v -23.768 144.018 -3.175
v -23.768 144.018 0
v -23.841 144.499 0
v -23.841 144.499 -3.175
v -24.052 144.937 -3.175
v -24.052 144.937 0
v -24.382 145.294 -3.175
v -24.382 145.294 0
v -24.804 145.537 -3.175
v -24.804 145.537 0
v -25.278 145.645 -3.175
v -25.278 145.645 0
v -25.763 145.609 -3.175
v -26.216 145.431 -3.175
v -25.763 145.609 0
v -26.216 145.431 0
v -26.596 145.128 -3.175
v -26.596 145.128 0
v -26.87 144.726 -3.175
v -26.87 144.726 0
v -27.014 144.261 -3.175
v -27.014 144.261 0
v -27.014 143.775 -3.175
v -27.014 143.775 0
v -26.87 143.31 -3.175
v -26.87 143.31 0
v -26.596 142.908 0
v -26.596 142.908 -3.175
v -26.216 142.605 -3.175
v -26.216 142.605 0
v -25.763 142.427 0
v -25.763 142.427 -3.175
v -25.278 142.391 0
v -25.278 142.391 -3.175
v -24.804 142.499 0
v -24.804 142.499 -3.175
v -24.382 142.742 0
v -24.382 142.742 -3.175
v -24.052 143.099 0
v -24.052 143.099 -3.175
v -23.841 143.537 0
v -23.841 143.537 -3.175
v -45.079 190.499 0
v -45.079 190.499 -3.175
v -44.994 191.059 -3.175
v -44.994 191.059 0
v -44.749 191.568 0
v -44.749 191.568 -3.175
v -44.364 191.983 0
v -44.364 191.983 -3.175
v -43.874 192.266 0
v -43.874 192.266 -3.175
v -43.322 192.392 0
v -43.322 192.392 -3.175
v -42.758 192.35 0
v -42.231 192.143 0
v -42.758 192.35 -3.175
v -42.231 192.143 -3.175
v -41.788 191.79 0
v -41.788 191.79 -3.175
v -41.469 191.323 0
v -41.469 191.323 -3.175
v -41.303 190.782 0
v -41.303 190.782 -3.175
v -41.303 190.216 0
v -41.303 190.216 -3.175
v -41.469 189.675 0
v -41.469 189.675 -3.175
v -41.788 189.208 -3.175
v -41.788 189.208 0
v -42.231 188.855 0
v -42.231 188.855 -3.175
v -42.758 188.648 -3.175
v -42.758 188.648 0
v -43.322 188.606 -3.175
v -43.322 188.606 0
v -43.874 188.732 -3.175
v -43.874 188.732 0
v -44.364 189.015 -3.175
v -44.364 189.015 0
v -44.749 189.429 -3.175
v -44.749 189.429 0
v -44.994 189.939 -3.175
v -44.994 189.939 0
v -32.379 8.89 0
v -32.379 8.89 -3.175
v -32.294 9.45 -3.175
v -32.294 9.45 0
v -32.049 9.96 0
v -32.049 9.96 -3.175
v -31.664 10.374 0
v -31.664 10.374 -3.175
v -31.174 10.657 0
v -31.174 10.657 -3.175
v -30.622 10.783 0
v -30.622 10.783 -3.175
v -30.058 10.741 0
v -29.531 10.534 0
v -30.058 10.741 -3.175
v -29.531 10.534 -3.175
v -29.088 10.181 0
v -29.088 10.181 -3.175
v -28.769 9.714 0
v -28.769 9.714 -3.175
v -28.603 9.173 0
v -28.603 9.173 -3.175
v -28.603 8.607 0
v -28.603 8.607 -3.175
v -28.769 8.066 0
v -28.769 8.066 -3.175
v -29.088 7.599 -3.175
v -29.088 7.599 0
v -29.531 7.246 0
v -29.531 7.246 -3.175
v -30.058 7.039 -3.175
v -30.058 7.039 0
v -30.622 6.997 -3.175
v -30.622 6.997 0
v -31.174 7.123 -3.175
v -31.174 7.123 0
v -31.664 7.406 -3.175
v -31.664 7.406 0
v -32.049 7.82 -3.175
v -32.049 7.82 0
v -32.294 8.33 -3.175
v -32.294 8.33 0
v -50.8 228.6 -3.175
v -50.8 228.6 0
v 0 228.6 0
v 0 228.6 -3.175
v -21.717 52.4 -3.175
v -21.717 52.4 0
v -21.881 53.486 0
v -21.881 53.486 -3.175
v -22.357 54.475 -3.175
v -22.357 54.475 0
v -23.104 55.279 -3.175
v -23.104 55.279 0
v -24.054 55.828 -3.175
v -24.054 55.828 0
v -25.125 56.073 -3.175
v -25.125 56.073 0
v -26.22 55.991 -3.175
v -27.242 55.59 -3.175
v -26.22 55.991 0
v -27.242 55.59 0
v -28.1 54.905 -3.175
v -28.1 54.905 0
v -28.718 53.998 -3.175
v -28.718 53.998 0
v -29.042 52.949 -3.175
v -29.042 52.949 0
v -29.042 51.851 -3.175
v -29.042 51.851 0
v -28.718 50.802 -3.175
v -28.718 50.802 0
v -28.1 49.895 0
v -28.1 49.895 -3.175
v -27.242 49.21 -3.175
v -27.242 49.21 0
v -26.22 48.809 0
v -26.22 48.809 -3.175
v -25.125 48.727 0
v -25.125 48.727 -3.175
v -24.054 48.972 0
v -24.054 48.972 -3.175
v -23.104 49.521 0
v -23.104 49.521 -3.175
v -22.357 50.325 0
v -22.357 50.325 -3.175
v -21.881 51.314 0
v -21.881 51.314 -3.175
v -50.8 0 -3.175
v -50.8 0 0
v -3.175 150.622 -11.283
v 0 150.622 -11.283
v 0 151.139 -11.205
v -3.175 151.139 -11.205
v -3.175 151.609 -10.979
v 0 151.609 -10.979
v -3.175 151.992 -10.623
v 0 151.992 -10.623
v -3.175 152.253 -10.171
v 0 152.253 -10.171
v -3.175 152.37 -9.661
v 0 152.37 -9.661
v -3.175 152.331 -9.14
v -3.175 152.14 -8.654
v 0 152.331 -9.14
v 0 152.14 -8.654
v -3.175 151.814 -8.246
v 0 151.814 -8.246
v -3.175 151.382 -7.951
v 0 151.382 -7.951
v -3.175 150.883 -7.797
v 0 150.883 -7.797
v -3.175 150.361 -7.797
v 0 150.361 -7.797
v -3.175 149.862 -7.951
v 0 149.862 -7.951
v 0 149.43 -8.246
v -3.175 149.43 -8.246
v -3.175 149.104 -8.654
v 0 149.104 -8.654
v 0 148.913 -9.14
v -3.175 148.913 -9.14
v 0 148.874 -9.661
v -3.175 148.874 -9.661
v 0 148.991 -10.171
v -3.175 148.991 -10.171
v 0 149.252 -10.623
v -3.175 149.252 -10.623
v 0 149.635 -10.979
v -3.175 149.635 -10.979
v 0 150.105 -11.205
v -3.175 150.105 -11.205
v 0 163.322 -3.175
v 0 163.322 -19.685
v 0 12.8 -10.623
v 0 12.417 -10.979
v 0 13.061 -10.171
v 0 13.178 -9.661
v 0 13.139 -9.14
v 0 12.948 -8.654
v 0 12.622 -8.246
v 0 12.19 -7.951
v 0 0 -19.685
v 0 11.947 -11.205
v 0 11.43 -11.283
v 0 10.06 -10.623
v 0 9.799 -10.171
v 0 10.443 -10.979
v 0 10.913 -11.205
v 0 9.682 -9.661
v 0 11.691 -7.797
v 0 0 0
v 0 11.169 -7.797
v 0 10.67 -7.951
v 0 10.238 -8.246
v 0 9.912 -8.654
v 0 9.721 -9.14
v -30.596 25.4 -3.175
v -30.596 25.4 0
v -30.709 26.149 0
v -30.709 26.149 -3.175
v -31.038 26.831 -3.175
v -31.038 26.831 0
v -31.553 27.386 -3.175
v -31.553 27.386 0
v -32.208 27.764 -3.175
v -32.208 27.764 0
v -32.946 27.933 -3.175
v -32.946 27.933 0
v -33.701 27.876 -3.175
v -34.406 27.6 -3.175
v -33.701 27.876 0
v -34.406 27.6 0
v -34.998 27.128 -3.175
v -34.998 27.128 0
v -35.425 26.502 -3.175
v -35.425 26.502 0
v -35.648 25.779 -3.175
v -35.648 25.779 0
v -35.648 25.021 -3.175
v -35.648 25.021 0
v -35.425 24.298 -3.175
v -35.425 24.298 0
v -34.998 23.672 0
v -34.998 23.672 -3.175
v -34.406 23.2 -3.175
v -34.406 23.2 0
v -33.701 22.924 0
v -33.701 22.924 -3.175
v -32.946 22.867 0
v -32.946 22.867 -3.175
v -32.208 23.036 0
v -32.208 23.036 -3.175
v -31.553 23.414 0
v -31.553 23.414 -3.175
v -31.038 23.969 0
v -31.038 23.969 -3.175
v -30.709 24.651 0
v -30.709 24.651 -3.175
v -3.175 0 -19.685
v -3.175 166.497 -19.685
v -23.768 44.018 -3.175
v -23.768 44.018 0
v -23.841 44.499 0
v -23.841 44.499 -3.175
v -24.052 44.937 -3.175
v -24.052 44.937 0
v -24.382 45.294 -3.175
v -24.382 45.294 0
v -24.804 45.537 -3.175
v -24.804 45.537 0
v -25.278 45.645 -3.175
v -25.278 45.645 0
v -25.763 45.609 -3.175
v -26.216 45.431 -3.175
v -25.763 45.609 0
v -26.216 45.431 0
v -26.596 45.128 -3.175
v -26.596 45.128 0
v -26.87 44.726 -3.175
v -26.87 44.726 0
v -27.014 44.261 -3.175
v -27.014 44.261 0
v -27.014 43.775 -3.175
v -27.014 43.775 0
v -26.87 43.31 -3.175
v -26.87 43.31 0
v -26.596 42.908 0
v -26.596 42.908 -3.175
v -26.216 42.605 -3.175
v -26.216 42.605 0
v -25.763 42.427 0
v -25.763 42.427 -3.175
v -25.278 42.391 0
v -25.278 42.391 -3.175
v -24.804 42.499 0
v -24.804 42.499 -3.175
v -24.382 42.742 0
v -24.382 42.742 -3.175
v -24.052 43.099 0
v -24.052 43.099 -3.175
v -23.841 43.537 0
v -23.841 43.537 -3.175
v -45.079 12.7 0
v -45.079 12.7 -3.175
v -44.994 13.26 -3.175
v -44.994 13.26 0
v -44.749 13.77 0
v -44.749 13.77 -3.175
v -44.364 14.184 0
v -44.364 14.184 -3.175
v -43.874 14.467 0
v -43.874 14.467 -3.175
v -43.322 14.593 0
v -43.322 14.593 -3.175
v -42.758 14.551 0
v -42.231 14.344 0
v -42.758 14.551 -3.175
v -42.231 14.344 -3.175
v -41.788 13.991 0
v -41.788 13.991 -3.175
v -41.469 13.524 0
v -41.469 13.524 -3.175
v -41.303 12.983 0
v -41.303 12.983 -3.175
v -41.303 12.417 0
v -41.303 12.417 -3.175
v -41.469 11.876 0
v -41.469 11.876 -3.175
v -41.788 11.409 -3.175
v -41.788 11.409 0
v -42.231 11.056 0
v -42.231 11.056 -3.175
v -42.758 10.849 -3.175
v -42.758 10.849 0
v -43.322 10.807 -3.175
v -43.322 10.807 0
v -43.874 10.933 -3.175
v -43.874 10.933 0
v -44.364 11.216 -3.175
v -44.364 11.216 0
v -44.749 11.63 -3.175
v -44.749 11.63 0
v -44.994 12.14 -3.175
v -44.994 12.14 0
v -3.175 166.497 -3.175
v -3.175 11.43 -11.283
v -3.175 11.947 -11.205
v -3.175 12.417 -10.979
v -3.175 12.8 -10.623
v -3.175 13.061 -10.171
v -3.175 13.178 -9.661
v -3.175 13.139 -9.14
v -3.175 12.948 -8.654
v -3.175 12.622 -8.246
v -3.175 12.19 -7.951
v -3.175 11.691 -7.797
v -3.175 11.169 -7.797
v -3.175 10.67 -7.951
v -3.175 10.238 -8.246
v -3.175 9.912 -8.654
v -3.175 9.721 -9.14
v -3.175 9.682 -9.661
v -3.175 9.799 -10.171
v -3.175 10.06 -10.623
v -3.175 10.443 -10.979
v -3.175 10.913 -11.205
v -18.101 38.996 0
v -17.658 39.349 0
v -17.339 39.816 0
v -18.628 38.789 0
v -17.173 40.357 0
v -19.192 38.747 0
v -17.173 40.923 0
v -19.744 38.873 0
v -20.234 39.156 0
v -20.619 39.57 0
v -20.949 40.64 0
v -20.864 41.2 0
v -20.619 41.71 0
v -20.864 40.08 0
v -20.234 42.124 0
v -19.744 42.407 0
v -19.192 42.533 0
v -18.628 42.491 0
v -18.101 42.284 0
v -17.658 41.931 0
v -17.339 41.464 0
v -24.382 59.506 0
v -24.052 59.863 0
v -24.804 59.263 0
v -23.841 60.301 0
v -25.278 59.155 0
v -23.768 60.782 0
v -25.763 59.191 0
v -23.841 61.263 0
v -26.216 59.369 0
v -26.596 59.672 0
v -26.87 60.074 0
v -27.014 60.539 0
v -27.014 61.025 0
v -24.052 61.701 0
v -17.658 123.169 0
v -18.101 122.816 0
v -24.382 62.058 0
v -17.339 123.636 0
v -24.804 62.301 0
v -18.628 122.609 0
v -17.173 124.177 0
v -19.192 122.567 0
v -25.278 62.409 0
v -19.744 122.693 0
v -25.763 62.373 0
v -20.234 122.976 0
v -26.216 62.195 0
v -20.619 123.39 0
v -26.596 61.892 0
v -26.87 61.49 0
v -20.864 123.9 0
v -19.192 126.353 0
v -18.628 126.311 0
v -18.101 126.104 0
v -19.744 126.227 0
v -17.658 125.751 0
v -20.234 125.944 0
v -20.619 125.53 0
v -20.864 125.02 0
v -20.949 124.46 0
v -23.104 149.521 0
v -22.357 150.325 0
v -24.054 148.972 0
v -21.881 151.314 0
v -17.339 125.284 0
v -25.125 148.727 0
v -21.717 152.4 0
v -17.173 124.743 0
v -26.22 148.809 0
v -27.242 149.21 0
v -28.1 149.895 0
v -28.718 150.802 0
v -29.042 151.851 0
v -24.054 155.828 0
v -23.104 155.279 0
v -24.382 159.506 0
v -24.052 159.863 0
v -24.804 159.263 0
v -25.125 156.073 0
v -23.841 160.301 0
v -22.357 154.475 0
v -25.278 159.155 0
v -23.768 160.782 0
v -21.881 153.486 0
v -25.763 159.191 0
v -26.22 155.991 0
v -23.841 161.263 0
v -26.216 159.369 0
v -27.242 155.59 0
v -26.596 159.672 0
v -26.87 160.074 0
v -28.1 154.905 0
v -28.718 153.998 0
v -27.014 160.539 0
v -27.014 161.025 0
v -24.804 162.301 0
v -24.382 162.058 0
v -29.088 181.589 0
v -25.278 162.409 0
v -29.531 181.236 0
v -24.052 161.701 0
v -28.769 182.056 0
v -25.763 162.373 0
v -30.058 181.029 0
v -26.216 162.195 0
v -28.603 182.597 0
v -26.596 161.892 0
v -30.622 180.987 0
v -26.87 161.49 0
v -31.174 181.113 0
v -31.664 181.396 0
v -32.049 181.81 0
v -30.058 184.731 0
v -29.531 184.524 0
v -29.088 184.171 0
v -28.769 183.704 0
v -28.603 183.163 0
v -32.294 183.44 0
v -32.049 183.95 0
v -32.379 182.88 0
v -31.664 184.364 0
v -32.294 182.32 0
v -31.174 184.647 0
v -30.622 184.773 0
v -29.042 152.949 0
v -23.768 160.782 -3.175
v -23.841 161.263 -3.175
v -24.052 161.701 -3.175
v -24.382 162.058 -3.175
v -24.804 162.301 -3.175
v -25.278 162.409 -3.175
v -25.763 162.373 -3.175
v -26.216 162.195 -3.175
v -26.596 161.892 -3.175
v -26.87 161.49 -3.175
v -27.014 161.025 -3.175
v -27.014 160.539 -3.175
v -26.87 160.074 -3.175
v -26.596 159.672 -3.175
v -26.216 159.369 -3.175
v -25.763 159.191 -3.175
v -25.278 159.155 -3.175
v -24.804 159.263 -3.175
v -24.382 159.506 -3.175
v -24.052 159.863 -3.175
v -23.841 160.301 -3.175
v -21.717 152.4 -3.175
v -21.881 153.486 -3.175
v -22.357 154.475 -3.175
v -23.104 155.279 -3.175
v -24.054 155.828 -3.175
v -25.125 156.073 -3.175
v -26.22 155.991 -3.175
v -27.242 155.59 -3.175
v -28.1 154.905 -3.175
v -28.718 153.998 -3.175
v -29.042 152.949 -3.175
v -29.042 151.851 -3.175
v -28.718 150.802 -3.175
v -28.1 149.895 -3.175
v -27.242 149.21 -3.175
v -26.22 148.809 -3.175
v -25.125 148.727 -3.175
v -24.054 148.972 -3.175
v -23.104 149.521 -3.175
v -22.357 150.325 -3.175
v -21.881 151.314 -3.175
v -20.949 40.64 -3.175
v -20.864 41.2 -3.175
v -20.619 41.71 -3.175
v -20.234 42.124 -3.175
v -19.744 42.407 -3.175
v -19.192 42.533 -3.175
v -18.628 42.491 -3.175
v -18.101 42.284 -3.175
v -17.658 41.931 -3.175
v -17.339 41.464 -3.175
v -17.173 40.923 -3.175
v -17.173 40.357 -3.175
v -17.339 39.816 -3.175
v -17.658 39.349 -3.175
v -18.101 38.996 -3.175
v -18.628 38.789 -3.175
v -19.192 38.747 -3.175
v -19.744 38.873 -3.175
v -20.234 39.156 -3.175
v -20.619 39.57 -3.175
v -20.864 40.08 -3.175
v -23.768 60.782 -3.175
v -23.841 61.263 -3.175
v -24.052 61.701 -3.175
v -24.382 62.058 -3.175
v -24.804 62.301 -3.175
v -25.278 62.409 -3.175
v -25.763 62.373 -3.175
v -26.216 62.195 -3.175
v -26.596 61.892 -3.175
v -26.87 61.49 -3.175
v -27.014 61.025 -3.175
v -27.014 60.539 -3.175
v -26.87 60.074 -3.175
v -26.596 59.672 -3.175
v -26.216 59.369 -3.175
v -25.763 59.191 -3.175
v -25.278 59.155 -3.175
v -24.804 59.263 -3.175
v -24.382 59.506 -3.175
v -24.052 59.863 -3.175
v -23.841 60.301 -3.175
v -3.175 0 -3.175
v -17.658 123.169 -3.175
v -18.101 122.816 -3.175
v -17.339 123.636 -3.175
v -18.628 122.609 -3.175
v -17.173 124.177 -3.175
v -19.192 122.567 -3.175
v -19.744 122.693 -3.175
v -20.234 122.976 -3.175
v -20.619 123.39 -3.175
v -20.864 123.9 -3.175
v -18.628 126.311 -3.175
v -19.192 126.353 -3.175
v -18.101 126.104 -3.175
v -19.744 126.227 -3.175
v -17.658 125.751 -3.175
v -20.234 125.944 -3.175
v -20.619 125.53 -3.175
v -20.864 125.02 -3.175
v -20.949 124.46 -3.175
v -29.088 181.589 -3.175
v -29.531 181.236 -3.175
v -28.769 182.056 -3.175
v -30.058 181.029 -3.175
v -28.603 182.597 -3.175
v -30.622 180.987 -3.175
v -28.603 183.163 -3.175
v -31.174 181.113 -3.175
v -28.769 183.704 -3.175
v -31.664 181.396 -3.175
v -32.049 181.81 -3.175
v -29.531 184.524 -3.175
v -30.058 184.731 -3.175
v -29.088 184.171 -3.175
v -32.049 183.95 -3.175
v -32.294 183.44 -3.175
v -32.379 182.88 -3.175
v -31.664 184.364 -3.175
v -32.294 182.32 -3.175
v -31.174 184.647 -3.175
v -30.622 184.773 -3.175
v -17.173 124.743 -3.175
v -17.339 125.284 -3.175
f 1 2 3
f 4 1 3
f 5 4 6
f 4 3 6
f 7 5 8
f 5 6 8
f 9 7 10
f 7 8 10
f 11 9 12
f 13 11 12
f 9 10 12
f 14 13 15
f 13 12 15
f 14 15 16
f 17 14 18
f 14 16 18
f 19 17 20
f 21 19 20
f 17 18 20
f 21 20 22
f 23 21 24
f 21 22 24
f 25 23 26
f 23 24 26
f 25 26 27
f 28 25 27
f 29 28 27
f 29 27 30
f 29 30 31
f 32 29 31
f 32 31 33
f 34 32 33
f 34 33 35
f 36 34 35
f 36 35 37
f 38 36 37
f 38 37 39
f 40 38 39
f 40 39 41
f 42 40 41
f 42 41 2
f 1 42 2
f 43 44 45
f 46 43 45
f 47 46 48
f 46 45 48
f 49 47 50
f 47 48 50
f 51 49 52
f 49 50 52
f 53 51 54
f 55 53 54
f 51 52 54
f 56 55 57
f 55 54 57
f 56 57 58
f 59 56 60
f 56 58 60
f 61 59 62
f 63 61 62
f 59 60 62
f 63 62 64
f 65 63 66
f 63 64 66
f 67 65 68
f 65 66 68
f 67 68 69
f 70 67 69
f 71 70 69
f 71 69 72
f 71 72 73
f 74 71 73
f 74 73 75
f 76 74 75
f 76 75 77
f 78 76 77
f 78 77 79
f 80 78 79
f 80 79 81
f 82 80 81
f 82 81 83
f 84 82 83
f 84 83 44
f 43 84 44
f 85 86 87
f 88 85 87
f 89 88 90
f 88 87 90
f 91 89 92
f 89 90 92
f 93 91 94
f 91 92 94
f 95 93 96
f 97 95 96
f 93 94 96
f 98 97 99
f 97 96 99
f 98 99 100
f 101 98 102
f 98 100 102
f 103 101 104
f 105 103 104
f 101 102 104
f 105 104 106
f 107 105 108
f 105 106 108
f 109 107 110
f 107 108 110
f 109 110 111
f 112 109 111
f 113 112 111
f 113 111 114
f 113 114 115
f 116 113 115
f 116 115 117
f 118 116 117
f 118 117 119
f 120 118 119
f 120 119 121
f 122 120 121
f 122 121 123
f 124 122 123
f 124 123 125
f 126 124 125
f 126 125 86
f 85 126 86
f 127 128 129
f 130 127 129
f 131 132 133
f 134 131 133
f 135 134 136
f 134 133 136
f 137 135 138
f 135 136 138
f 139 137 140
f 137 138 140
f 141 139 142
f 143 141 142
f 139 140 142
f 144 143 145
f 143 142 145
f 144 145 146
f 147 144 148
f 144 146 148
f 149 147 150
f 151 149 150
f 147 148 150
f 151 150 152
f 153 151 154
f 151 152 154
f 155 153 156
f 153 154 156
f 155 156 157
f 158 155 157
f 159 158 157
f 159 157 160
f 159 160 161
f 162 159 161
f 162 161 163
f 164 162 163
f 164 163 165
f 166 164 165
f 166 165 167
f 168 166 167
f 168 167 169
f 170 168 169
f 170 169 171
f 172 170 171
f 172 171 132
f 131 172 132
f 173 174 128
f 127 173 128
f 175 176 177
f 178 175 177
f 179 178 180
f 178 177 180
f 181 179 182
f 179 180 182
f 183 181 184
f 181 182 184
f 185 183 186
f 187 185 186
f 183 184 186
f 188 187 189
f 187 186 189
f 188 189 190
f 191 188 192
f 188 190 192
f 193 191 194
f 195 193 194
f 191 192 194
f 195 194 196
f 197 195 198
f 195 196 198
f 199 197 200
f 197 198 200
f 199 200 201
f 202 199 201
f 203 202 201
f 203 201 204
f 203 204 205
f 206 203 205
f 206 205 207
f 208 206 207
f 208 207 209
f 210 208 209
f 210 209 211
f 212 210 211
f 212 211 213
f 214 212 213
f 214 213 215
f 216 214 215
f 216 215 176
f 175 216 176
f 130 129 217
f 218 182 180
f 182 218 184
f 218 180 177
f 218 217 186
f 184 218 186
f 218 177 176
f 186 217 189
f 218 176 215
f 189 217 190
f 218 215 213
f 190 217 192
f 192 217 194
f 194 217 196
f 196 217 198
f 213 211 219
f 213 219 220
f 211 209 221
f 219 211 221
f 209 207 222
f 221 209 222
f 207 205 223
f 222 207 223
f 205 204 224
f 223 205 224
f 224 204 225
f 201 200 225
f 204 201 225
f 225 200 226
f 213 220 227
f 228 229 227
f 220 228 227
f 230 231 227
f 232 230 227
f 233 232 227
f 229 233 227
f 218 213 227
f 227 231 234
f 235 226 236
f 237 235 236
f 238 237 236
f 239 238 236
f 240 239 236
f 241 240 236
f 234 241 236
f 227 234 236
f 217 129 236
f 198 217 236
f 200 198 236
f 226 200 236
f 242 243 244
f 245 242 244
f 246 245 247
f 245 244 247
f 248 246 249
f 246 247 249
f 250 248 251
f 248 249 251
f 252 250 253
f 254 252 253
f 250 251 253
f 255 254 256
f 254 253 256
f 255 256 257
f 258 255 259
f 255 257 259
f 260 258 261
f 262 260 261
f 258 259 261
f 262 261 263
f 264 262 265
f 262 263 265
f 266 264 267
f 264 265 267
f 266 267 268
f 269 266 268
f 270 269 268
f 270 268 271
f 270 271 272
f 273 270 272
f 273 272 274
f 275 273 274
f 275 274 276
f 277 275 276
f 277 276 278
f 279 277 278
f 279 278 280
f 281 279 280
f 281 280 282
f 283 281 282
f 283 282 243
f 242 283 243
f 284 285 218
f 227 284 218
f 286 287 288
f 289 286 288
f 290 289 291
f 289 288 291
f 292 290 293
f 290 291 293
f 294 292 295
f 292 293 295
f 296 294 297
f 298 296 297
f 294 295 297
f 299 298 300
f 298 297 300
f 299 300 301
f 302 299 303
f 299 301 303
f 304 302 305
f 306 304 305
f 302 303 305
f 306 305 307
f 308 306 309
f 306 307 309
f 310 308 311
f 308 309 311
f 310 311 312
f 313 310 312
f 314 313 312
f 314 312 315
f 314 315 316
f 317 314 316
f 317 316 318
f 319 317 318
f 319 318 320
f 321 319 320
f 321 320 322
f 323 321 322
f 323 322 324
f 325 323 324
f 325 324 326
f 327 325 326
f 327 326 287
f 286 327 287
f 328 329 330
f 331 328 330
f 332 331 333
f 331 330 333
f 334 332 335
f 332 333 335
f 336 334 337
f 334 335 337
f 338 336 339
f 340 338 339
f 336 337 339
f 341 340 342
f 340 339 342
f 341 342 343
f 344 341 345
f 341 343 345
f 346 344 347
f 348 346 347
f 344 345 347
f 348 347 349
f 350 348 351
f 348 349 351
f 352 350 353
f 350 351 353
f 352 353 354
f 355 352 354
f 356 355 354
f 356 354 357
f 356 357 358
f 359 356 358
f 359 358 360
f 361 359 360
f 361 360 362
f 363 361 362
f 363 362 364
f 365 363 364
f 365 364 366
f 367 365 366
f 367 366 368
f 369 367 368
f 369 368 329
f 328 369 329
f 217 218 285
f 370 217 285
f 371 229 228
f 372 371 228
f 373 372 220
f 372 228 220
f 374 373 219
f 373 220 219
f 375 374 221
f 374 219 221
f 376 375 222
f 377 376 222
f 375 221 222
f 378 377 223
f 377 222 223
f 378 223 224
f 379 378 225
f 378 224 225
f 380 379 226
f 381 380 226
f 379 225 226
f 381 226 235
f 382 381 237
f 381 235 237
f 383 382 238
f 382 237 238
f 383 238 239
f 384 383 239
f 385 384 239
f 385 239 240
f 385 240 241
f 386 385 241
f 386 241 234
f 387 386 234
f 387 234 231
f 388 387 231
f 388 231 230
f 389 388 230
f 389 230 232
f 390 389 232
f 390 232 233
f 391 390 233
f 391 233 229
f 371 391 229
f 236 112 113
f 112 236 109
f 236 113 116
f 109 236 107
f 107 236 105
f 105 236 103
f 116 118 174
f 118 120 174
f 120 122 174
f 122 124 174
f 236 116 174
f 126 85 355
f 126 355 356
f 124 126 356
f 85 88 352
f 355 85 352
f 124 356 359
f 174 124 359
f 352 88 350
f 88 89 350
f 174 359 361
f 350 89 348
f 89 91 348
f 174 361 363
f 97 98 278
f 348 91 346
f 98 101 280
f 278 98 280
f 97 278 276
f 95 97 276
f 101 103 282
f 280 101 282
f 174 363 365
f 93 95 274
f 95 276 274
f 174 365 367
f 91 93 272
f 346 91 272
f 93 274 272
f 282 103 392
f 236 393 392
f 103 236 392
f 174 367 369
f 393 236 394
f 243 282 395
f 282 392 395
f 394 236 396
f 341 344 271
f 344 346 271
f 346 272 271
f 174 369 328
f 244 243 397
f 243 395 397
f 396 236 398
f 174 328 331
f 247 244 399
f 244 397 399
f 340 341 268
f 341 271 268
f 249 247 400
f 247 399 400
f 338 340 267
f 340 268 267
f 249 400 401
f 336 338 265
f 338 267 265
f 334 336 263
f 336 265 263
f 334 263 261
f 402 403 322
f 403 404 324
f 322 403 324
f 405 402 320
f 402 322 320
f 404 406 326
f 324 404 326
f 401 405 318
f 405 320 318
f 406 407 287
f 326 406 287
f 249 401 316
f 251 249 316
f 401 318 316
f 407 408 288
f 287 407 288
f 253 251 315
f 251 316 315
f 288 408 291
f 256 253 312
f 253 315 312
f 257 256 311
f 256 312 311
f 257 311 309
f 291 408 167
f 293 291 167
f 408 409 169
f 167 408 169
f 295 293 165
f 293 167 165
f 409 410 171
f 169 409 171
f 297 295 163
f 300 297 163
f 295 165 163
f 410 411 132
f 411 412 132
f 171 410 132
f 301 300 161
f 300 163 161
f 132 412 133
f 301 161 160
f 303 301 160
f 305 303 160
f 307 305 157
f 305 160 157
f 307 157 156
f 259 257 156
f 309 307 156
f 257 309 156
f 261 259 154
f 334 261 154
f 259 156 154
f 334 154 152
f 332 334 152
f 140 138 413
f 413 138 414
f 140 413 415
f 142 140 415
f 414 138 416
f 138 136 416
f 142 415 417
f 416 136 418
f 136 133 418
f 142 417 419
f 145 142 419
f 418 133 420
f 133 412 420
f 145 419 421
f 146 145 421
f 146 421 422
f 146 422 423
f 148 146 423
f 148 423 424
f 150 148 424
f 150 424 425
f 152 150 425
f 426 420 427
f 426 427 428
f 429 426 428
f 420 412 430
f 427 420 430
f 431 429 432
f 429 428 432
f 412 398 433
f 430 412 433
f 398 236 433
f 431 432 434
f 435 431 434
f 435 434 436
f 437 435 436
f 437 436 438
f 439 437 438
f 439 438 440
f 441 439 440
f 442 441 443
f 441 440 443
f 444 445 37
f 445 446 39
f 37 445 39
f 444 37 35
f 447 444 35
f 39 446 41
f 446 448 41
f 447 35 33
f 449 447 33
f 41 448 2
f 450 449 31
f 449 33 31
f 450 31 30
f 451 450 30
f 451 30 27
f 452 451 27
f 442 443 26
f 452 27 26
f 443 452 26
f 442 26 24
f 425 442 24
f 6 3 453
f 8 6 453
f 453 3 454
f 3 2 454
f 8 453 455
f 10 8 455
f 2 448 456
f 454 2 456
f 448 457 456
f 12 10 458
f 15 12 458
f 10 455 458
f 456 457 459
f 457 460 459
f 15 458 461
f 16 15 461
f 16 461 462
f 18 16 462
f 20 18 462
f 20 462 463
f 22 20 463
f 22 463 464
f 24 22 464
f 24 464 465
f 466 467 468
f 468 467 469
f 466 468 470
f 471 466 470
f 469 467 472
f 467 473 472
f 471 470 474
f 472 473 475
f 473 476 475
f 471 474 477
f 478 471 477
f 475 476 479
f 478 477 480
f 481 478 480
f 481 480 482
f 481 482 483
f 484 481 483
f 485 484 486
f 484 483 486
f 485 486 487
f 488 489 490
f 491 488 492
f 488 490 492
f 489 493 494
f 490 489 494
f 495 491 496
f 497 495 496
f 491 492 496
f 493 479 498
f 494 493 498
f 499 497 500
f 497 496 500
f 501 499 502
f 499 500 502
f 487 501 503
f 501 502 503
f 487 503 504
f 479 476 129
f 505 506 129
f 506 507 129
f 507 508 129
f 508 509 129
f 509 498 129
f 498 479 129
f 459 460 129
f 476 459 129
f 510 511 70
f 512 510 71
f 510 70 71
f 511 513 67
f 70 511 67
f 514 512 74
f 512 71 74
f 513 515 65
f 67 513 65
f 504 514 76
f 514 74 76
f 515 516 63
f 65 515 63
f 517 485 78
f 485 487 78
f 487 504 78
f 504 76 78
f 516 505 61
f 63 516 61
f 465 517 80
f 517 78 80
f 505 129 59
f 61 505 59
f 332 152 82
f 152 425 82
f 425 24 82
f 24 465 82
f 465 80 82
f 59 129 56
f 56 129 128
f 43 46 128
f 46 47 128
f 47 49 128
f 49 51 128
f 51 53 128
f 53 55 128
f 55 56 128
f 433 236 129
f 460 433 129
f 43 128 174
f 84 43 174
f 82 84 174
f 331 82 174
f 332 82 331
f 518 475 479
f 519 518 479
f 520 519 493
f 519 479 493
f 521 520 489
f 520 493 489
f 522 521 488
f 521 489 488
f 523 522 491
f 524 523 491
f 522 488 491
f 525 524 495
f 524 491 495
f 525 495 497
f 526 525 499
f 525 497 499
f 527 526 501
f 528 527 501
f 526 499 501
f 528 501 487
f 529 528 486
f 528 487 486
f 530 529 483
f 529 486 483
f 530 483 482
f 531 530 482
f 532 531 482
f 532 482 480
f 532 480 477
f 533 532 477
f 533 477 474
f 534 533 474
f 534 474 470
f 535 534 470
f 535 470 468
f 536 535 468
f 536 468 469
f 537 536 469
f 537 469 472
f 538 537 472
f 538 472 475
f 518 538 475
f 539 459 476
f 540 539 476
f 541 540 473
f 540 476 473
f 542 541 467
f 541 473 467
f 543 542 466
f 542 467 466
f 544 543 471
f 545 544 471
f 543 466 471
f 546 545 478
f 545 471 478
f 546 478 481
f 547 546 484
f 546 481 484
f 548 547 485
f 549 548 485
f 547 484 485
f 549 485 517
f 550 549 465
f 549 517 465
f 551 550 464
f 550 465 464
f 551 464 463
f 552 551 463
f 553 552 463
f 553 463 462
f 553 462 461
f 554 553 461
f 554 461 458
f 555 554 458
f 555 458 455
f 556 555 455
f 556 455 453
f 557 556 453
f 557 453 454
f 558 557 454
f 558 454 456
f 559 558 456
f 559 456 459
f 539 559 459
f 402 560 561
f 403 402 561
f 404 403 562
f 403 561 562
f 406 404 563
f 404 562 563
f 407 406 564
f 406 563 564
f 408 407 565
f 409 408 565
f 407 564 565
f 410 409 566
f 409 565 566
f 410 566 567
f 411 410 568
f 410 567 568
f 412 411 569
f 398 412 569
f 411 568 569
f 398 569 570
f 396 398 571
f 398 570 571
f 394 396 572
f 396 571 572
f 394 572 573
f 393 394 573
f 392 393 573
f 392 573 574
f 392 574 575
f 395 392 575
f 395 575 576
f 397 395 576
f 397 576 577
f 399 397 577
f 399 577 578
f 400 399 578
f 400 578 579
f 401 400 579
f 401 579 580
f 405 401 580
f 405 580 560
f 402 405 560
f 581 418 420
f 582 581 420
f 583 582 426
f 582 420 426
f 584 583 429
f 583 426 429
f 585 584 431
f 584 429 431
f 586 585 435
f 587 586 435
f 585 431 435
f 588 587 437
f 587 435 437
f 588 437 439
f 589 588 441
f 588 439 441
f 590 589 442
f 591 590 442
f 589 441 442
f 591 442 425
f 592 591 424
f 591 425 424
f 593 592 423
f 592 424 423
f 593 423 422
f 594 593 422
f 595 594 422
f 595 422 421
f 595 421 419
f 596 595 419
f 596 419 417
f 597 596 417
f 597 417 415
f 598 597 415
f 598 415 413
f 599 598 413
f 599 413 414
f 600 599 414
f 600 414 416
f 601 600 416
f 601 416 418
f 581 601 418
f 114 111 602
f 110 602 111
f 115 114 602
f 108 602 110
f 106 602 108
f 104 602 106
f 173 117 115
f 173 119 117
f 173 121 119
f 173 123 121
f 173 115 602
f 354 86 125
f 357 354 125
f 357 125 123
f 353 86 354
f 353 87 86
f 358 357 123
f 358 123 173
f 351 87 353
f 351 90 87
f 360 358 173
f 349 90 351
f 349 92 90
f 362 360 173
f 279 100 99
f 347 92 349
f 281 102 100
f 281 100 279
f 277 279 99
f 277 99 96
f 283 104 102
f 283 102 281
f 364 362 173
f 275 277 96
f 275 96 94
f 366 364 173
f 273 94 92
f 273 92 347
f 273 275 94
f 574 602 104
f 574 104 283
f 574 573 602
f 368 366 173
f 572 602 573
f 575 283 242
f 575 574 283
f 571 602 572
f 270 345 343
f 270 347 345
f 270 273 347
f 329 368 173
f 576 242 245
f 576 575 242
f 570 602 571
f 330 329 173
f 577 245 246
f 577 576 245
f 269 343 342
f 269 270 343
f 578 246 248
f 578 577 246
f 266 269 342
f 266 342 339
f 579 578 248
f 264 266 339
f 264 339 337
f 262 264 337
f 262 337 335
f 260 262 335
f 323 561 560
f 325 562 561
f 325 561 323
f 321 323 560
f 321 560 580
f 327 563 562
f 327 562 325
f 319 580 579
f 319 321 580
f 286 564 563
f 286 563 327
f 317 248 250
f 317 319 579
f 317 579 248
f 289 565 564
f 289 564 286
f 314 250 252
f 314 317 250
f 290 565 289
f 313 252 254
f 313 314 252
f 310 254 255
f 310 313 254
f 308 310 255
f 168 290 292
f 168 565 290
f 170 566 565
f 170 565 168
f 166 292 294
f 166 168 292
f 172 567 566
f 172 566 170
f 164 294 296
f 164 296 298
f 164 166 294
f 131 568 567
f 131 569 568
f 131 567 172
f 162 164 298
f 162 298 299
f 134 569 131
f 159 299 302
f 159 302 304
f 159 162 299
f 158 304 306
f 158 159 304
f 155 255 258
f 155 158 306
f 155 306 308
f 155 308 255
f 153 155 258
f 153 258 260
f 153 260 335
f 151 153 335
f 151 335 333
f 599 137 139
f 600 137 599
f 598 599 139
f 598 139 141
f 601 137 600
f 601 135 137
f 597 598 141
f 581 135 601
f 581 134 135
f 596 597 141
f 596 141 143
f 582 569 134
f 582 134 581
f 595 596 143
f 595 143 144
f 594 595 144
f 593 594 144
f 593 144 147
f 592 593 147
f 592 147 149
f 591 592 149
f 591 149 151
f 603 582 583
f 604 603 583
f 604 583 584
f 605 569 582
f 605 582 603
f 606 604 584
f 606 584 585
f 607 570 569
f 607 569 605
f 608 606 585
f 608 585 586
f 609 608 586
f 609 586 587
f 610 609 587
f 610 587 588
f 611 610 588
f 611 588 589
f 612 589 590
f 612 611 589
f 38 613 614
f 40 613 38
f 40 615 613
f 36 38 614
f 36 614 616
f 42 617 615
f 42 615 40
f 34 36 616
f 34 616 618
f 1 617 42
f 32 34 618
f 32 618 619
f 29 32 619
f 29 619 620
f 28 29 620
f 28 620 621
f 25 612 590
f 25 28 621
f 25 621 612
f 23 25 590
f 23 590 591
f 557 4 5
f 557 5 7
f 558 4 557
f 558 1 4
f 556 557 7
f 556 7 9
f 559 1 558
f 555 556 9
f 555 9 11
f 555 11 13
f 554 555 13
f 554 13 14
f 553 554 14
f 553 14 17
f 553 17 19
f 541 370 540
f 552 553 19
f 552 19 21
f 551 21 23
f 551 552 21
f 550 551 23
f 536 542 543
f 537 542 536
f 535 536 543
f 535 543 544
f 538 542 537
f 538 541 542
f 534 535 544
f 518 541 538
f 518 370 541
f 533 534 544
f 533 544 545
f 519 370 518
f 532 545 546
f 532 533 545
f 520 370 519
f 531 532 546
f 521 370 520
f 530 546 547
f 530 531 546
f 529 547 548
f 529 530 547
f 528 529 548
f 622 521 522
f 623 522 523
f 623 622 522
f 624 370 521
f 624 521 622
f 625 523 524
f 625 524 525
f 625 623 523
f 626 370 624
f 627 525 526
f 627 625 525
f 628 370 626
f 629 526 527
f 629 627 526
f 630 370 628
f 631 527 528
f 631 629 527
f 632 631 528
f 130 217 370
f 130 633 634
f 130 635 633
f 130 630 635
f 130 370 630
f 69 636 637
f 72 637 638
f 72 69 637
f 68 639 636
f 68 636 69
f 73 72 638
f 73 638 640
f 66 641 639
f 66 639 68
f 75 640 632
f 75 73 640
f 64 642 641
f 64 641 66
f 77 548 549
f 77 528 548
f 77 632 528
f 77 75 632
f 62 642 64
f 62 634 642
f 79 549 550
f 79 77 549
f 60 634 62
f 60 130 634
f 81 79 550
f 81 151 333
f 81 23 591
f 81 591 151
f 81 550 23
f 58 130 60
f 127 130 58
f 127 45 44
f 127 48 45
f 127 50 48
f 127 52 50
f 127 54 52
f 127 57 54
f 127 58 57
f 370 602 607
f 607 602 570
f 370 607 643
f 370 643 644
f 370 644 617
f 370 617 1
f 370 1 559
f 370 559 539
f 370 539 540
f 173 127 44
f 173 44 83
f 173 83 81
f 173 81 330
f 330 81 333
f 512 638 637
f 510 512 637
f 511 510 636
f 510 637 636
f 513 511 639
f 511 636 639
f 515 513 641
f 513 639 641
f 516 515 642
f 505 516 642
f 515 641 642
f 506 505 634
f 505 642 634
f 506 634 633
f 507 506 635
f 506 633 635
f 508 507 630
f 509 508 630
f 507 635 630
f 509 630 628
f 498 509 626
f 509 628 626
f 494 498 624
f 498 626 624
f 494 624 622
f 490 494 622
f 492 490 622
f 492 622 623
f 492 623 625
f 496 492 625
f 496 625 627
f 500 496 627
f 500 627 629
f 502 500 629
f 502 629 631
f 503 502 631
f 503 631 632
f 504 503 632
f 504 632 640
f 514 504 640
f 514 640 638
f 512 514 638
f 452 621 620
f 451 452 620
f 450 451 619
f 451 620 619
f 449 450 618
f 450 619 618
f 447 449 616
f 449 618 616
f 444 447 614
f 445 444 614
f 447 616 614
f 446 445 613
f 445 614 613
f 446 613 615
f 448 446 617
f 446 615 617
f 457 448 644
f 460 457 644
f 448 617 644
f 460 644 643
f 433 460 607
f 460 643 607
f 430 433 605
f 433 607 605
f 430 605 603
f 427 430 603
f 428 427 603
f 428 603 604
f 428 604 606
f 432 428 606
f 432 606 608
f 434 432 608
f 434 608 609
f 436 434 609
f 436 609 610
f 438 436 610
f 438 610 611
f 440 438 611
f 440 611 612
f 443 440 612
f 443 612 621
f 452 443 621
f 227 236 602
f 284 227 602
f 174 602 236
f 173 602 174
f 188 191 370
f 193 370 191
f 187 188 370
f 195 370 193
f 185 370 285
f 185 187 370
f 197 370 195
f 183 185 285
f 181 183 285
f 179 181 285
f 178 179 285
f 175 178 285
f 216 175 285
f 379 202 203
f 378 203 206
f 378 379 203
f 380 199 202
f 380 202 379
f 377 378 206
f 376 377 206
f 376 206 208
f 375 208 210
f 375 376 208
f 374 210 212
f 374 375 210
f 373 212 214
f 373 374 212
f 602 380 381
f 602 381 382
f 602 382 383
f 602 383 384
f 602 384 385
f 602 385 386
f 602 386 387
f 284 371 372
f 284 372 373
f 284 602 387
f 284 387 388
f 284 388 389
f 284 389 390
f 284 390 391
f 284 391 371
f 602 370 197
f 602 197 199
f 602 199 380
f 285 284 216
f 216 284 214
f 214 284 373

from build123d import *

# Parameters (mm, degrees)
BOSS_EXTRUDE1_DEPTH     = 203.2
CUT_EXTRUDE2_DEPTH      = 20.685
SKETCH5_R               = 3.683
SKETCH5_R_2             = 1.63195
CUT_EXTRUDE3_DEPTH      = 20.685
SKETCH6_R               = 1.7526
CUT_EXTRUDE4_DEPTH      = 51.8
SKETCH8_R               = 1.89865
CUT_EXTRUDE5_DEPTH      = 4.175
SKETCH9_R               = 1.89865
CUT_EXTRUDE6_DEPTH      = 4.175
BOSS_EXTRUDE2_DEPTH     = 3.175
SKETCH11_R              = 2.54
CUT_EXTRUDE7_DEPTH      = 20.685
SKETCH12_R              = 1.89865
CUT_EXTRUDE8_DEPTH      = 4.175
SKETCH13_R              = 3.683
SKETCH13_R_2            = 1.63195
CUT_EXTRUDE9_DEPTH      = 1
CUT_EXTRUDE9_DEPTH_BACK = 20.685


with BuildPart() as part:
    # Sketch1 → Boss-Extrude1 (new body)
    with BuildSketch(Plane(origin=(0, 0, 0), x_dir=(1, 0, 0), z_dir=(0, 1, 0))):
        Polygon((0, 0), (-50.8, 0), (-50.8, 3.175), (-3.175, 3.175), (-3.175, 19.685), (0, 19.685), align=None)
    extrude(amount=BOSS_EXTRUDE1_DEPTH)

    # Sketch4 → Cut-Extrude2 (cut, through all)
    with BuildSketch(Plane.XY):
        Polygon((-50.8, 214.122), (-57.250524058, 214.122), (-57.250524058, 247.071987418), (14.491605927, 247.071987418), (14.491605927, 163.322), (0, 163.322), align=None)
    extrude(amount=-CUT_EXTRUDE2_DEPTH, mode=Mode.SUBTRACT)

    # Sketch5 → Cut-Extrude3 (cut, through all)
    with BuildSketch(Plane.XY):
        with Locations((-25.4, 152.4)):
            Circle(SKETCH5_R)
        with Locations((-25.4, 160.782)):
            Circle(SKETCH5_R_2)
        with Locations((-25.4, 144.018)):
            Circle(SKETCH5_R_2)
    extrude(amount=-CUT_EXTRUDE3_DEPTH, mode=Mode.SUBTRACT)

    # Sketch6 → Cut-Extrude4 (cut, through all)
    with BuildSketch(Plane(origin=(0, 0, 0), x_dir=(0, 0, -1), z_dir=(1, 0, 0))):
        with Locations((9.530474513, 11.43)):
            Circle(SKETCH6_R)
        with Locations((9.530474513, 150.622)):
            Circle(SKETCH6_R)
    extrude(amount=-CUT_EXTRUDE4_DEPTH, mode=Mode.SUBTRACT)

    # Sketch8 → Cut-Extrude5 (cut, through all)
    with BuildSketch(Plane(origin=(0, 0, -3.175), x_dir=(-1, 0, 0), z_dir=(0, 0, -1))):
        with Locations((30.48, 8.89)):
            Circle(SKETCH8_R)
        with Locations((30.48, 182.88)):
            Circle(SKETCH8_R)
    extrude(amount=-CUT_EXTRUDE5_DEPTH, mode=Mode.SUBTRACT)

    # Sketch9 → Cut-Extrude6 (cut, through all)
    with BuildSketch(Plane(origin=(0, 0, -3.175), x_dir=(-1, 0, 0), z_dir=(0, 0, -1))):
        with Locations((19.05, 40.64)):
            Circle(SKETCH9_R)
        with Locations((19.05, 124.46)):
            Circle(SKETCH9_R)
    extrude(amount=-CUT_EXTRUDE6_DEPTH, mode=Mode.SUBTRACT)

    # Sketch10 → Boss-Extrude2 (add)
    with BuildSketch(Plane.XY):
        Polygon((0, 228.6), (0, 163.322), (-39.878, 203.2), (-50.8, 203.2), (-50.8, 228.6), align=None)
    extrude(amount=-BOSS_EXTRUDE2_DEPTH)

    # Sketch11 → Cut-Extrude7 (cut, through all)
    with BuildSketch(Plane.XY):
        with Locations((-33.136196499, 25.4)):
            Circle(SKETCH11_R)
    extrude(amount=-CUT_EXTRUDE7_DEPTH, mode=Mode.SUBTRACT)

    # Sketch12 → Cut-Extrude8 (cut, through all)
    with BuildSketch(Plane(origin=(0, 0, -3.175), x_dir=(-1, 0, 0), z_dir=(0, 0, -1))):
        with Locations((43.18, 12.7)):
            Circle(SKETCH12_R)
        with Locations((43.18, 190.498941664)):
            Circle(SKETCH12_R)
    extrude(amount=-CUT_EXTRUDE8_DEPTH, mode=Mode.SUBTRACT)

    # Sketch13 → Cut-Extrude9 (cut, two sides)
    with BuildSketch(Plane.XY) as cut_extrude9_sk:
        with Locations((-25.4, 52.4)):
            Circle(SKETCH13_R)
        with Locations((-25.4, 60.782)):
            Circle(SKETCH13_R_2)
        with Locations((-25.4, 44.018)):
            Circle(SKETCH13_R_2)
    extrude(amount=CUT_EXTRUDE9_DEPTH, mode=Mode.SUBTRACT)
    extrude(cut_extrude9_sk.sketch, amount=-CUT_EXTRUDE9_DEPTH_BACK, mode=Mode.SUBTRACT)


solid = part.part
